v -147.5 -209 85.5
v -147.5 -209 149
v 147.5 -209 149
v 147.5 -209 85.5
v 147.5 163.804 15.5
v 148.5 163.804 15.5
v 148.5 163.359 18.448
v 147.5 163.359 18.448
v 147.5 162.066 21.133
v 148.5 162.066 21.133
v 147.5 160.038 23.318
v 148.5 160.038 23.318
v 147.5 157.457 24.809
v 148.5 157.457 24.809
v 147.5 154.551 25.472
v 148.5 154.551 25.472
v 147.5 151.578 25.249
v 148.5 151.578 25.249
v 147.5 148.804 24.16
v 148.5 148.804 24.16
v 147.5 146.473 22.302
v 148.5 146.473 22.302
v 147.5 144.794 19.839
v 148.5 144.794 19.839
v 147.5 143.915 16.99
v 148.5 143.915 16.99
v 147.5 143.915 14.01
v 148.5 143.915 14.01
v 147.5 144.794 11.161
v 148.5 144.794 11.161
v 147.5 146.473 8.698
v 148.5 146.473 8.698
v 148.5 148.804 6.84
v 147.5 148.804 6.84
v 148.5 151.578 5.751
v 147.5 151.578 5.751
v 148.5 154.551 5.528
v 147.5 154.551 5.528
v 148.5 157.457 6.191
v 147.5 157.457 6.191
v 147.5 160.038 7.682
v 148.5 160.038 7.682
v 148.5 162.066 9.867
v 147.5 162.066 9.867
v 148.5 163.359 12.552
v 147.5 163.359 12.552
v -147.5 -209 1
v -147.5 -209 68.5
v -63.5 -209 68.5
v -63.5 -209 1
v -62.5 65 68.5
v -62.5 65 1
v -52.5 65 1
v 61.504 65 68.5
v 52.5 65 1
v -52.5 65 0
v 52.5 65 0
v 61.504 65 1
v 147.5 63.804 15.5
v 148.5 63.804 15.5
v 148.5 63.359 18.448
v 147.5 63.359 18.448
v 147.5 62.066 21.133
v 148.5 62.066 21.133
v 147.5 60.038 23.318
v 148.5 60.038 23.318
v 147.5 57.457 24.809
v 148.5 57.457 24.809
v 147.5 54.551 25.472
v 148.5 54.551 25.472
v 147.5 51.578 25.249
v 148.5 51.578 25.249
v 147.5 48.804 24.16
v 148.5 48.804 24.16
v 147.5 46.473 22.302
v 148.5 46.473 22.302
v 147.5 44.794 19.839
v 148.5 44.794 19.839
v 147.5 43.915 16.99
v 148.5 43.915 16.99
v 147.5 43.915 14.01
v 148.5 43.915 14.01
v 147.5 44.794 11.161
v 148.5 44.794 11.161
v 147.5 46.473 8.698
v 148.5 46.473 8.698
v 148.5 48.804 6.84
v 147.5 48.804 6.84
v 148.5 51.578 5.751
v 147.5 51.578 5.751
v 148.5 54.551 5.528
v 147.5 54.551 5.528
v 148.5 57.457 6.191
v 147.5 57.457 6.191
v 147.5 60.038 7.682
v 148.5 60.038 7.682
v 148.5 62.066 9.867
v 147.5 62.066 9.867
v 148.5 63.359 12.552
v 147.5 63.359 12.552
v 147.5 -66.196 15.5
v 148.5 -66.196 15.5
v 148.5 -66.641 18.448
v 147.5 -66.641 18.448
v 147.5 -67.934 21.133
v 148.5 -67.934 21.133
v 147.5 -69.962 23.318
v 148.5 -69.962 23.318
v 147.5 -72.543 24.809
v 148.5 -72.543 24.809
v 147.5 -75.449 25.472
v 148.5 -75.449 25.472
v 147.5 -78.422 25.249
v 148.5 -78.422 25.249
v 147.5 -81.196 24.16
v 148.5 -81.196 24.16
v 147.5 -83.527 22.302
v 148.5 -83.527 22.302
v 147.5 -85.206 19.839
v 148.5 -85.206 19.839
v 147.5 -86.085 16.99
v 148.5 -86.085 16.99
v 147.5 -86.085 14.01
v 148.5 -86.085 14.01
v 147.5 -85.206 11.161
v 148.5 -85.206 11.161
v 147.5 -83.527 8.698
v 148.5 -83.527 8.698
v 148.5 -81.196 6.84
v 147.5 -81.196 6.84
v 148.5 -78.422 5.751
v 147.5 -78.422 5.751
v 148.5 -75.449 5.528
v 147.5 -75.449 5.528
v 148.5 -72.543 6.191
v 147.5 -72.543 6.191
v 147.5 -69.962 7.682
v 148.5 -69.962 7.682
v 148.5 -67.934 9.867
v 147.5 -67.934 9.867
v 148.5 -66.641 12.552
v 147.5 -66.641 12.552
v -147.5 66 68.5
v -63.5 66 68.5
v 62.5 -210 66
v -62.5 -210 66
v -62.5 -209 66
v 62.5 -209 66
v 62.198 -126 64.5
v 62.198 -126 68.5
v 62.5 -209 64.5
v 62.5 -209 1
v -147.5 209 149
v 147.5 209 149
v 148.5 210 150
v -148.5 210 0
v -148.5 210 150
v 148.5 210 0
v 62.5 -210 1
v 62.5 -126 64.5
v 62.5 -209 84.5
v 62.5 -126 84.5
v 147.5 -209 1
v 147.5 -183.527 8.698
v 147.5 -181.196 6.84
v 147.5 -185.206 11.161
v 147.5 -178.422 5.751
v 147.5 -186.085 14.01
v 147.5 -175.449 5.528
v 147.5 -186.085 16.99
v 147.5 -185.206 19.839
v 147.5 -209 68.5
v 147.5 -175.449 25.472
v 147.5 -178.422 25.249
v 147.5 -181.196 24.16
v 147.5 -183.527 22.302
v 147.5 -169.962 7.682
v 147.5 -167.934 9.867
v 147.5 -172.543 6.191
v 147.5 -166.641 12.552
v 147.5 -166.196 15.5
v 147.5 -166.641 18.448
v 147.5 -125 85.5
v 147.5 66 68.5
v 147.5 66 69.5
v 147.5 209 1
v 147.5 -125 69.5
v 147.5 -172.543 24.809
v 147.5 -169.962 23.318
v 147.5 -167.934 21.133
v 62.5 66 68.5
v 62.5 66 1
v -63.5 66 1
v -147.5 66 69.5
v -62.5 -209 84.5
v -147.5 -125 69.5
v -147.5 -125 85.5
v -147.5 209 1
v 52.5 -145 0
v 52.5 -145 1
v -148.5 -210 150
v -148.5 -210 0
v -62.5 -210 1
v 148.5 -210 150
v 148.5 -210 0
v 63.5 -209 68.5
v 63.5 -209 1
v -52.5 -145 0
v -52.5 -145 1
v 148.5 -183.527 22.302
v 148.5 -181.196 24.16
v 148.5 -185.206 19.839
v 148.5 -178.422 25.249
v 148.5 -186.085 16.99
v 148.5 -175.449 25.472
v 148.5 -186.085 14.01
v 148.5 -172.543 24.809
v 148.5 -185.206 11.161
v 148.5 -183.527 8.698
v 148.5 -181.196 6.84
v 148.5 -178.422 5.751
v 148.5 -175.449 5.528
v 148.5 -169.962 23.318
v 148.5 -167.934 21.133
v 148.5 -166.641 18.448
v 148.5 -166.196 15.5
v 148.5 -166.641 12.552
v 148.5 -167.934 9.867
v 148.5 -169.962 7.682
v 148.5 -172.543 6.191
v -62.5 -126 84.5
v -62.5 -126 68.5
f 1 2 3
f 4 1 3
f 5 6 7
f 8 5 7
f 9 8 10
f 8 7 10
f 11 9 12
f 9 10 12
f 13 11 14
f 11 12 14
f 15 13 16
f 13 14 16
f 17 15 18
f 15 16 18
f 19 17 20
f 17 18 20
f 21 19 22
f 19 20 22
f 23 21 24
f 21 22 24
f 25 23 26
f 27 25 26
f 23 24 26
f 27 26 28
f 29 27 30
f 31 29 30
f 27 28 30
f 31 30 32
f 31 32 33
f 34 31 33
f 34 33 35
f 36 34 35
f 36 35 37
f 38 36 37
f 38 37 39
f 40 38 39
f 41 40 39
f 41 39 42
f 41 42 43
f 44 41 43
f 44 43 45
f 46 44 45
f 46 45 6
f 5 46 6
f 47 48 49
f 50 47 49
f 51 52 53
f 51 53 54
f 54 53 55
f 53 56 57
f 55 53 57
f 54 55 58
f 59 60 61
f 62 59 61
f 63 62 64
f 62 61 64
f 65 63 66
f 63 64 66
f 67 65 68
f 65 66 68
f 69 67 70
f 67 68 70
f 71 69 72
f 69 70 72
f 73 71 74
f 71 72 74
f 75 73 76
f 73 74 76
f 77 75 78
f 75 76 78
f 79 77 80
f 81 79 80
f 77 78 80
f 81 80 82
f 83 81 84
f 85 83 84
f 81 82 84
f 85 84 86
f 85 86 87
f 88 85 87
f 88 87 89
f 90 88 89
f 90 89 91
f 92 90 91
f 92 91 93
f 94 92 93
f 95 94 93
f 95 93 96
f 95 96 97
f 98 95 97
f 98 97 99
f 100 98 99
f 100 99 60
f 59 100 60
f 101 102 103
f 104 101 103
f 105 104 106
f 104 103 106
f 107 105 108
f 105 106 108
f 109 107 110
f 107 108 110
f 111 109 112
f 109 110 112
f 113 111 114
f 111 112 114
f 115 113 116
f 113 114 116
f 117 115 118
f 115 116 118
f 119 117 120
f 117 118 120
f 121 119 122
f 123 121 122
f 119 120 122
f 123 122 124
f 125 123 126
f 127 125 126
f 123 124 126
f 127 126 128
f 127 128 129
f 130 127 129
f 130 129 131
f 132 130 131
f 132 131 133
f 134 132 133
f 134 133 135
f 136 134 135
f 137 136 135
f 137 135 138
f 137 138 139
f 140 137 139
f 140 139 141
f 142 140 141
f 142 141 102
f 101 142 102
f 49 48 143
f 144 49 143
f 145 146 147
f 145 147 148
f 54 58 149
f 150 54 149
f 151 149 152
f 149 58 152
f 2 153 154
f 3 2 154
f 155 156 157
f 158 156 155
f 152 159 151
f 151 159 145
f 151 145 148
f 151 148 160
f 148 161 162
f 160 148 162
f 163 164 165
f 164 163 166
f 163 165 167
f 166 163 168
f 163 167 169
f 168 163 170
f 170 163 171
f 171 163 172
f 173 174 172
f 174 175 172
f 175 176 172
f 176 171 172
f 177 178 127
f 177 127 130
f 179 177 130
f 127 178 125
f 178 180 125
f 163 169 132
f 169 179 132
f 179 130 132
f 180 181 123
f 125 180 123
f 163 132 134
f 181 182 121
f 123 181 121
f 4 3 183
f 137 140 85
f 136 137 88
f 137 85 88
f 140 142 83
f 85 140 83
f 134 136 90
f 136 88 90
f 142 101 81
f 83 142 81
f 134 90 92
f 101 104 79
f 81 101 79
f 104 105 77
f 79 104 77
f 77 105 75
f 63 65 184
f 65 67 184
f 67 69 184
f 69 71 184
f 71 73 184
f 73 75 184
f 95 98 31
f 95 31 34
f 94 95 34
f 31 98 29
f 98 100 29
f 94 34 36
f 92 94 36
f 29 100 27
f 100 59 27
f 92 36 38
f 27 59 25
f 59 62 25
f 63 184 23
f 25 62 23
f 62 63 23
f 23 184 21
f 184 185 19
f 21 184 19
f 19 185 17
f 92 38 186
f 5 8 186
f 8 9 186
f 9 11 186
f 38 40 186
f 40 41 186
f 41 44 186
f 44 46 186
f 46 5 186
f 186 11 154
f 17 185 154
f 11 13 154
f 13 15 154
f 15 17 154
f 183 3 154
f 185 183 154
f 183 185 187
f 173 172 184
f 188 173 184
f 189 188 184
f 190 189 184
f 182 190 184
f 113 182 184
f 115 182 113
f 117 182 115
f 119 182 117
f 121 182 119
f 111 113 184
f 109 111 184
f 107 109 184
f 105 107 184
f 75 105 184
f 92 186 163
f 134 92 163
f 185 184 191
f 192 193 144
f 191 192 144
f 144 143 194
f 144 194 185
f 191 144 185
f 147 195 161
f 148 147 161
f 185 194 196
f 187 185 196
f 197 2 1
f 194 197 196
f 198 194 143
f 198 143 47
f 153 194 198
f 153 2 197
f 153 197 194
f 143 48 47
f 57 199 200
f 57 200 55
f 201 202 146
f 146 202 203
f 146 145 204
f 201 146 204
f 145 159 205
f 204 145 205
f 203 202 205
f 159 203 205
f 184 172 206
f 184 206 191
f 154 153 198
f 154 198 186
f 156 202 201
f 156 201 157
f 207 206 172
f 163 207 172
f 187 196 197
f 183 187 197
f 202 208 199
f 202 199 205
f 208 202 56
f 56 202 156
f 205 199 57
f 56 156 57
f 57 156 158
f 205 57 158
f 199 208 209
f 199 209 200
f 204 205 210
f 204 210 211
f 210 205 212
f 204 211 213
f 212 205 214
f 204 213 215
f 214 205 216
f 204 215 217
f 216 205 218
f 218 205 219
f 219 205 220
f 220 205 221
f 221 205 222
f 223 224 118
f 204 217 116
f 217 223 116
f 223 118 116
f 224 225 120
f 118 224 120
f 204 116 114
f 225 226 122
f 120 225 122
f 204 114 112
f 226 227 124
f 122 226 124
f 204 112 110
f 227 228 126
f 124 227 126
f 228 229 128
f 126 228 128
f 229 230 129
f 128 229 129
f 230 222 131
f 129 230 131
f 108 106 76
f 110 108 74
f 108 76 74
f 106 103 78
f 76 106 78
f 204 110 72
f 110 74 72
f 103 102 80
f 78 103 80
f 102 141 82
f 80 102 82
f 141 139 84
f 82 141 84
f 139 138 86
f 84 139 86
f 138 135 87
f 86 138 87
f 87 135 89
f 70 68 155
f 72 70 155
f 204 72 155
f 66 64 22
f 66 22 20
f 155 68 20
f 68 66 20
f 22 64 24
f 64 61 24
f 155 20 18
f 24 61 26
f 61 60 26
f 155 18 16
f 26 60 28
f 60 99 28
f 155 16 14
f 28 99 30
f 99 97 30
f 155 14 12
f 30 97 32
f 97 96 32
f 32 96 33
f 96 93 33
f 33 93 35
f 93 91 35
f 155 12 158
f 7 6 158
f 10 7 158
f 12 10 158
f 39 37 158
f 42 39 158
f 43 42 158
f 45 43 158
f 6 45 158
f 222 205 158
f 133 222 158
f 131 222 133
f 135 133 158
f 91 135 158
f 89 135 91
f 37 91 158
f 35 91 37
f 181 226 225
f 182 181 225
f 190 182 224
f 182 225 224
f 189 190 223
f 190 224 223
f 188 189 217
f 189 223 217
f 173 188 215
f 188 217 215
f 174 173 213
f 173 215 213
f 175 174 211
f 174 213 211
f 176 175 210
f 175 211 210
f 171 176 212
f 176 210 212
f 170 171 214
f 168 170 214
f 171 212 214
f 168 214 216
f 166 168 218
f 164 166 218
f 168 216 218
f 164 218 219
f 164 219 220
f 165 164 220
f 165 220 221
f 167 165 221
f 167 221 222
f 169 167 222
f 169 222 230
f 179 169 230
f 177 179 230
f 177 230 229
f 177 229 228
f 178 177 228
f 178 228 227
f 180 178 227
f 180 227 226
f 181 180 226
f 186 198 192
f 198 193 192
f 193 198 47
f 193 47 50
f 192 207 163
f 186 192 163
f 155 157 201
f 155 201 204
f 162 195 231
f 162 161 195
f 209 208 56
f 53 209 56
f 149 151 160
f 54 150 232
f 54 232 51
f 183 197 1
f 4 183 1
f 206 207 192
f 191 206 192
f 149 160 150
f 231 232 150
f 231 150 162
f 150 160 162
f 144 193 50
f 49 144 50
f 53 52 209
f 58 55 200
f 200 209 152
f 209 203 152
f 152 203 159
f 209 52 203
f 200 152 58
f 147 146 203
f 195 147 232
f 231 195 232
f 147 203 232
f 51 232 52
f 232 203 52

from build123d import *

# Parameters (mm, degrees)
F0_W      = 297
F0_H      = 420
F1_DEPTH  = 150
F3_START  = -1
F2_W      = 295
F2_H      = 418
F3_DEPTH  = 148
F4_W      = 125
F4_H      = 65
F5_DEPTH  = 25
F6_W      = 105
F6_H      = 210
F7_DEPTH  = 25
F9_DEPTH  = 67.5
F11_DEPTH = 295
F12_W     = 83
F12_H     = 1
F13_DEPTH = 148.5
F15_W     = 83
F15_H     = 15.0031849133
F16_DEPTH = 295
F14_W     = 83
F14_H     = 20
F17_DEPTH = 62.5
F18_R     = 10
F19_DEPTH = 7.5


with BuildPart() as f1:
    # F0 (on Top) → F1 (new body)
    with BuildSketch(Plane.XY):
        Rectangle(F0_W, F0_H)
    extrude(amount=F1_DEPTH)

    # F2 (on face) → F3 (cut)
    with BuildSketch(Plane.XY.offset(150).offset(F3_START)):
        Rectangle(F2_W, F2_H)
    extrude(amount=-F3_DEPTH, mode=Mode.SUBTRACT)

    # F4 (on face) → F5 (cut)
    with BuildSketch(Plane.XZ.offset(210)):
        with Locations((0, 33.5)):
            Rectangle(F4_W, F4_H)
    extrude(amount=-F5_DEPTH, mode=Mode.SUBTRACT)

    # F6 (on Top) → F7 (cut)
    with BuildSketch(Plane.XY):
        with Locations((0, -40)):
            Rectangle(F6_W, F6_H)
    extrude(amount=F7_DEPTH, mode=Mode.SUBTRACT)

    # F8 (on face) → F9 (join)
    with BuildSketch(Plane.XY.offset(1)):
        Polygon((-63.5, -209), (-62.5, -209), (-62.5, 65), (61.5036363636, 65), (62.5, -209), (63.5, -209), (62.5, 66), (-63.5, 66), align=None)
    extrude(amount=F9_DEPTH)

    # F10 (on face) → F11 (join, through all)
    with BuildSketch(Plane.YZ.offset(-147.5)):
        Polygon((-126, 68.5), (66, 68.5), (66, 69.5), (-125, 69.5), (-125, 85.5), (-209, 85.5), (-209.0797476204, 84.5031849133), (-126, 84.5031849133), align=None)
    extrude(amount=F11_DEPTH)

    # F12 (on Right) → F13 (join, symmetric)
    with BuildSketch(Plane.YZ):
        with Locations((-167.5, 69)):
            Rectangle(F12_W, F12_H)
    extrude(amount=F13_DEPTH, both=True)

    # F15 (on face) → F16 (join, through all)
    with BuildSketch(Plane.YZ.offset(-147.5)):
        with Locations((-167.5, 77.0015924567)):
            Rectangle(F15_W, F15_H)
    extrude(amount=F16_DEPTH)

    # F14 (on Right) → F17 (cut, symmetric)
    with BuildSketch(Plane.YZ):
        with Locations((-167.5, 74.5)):
            Rectangle(F14_W, F14_H)
    extrude(amount=F17_DEPTH, both=True, mode=Mode.SUBTRACT)

    # F18 (on face) → F19 (cut)
    with BuildSketch(Plane.YZ.offset(148.5)):
        with Locations((-176.1964619943, 15.5)):
            Circle(F18_R)
        with Locations((-76.1964619943, 15.5)):
            Circle(F18_R)
        with Locations((53.8035380057, 15.5)):
            Circle(F18_R)
        with Locations((153.8035380057, 15.5)):
            Circle(F18_R)
    extrude(amount=-F19_DEPTH, mode=Mode.SUBTRACT)


solid = f1.part
